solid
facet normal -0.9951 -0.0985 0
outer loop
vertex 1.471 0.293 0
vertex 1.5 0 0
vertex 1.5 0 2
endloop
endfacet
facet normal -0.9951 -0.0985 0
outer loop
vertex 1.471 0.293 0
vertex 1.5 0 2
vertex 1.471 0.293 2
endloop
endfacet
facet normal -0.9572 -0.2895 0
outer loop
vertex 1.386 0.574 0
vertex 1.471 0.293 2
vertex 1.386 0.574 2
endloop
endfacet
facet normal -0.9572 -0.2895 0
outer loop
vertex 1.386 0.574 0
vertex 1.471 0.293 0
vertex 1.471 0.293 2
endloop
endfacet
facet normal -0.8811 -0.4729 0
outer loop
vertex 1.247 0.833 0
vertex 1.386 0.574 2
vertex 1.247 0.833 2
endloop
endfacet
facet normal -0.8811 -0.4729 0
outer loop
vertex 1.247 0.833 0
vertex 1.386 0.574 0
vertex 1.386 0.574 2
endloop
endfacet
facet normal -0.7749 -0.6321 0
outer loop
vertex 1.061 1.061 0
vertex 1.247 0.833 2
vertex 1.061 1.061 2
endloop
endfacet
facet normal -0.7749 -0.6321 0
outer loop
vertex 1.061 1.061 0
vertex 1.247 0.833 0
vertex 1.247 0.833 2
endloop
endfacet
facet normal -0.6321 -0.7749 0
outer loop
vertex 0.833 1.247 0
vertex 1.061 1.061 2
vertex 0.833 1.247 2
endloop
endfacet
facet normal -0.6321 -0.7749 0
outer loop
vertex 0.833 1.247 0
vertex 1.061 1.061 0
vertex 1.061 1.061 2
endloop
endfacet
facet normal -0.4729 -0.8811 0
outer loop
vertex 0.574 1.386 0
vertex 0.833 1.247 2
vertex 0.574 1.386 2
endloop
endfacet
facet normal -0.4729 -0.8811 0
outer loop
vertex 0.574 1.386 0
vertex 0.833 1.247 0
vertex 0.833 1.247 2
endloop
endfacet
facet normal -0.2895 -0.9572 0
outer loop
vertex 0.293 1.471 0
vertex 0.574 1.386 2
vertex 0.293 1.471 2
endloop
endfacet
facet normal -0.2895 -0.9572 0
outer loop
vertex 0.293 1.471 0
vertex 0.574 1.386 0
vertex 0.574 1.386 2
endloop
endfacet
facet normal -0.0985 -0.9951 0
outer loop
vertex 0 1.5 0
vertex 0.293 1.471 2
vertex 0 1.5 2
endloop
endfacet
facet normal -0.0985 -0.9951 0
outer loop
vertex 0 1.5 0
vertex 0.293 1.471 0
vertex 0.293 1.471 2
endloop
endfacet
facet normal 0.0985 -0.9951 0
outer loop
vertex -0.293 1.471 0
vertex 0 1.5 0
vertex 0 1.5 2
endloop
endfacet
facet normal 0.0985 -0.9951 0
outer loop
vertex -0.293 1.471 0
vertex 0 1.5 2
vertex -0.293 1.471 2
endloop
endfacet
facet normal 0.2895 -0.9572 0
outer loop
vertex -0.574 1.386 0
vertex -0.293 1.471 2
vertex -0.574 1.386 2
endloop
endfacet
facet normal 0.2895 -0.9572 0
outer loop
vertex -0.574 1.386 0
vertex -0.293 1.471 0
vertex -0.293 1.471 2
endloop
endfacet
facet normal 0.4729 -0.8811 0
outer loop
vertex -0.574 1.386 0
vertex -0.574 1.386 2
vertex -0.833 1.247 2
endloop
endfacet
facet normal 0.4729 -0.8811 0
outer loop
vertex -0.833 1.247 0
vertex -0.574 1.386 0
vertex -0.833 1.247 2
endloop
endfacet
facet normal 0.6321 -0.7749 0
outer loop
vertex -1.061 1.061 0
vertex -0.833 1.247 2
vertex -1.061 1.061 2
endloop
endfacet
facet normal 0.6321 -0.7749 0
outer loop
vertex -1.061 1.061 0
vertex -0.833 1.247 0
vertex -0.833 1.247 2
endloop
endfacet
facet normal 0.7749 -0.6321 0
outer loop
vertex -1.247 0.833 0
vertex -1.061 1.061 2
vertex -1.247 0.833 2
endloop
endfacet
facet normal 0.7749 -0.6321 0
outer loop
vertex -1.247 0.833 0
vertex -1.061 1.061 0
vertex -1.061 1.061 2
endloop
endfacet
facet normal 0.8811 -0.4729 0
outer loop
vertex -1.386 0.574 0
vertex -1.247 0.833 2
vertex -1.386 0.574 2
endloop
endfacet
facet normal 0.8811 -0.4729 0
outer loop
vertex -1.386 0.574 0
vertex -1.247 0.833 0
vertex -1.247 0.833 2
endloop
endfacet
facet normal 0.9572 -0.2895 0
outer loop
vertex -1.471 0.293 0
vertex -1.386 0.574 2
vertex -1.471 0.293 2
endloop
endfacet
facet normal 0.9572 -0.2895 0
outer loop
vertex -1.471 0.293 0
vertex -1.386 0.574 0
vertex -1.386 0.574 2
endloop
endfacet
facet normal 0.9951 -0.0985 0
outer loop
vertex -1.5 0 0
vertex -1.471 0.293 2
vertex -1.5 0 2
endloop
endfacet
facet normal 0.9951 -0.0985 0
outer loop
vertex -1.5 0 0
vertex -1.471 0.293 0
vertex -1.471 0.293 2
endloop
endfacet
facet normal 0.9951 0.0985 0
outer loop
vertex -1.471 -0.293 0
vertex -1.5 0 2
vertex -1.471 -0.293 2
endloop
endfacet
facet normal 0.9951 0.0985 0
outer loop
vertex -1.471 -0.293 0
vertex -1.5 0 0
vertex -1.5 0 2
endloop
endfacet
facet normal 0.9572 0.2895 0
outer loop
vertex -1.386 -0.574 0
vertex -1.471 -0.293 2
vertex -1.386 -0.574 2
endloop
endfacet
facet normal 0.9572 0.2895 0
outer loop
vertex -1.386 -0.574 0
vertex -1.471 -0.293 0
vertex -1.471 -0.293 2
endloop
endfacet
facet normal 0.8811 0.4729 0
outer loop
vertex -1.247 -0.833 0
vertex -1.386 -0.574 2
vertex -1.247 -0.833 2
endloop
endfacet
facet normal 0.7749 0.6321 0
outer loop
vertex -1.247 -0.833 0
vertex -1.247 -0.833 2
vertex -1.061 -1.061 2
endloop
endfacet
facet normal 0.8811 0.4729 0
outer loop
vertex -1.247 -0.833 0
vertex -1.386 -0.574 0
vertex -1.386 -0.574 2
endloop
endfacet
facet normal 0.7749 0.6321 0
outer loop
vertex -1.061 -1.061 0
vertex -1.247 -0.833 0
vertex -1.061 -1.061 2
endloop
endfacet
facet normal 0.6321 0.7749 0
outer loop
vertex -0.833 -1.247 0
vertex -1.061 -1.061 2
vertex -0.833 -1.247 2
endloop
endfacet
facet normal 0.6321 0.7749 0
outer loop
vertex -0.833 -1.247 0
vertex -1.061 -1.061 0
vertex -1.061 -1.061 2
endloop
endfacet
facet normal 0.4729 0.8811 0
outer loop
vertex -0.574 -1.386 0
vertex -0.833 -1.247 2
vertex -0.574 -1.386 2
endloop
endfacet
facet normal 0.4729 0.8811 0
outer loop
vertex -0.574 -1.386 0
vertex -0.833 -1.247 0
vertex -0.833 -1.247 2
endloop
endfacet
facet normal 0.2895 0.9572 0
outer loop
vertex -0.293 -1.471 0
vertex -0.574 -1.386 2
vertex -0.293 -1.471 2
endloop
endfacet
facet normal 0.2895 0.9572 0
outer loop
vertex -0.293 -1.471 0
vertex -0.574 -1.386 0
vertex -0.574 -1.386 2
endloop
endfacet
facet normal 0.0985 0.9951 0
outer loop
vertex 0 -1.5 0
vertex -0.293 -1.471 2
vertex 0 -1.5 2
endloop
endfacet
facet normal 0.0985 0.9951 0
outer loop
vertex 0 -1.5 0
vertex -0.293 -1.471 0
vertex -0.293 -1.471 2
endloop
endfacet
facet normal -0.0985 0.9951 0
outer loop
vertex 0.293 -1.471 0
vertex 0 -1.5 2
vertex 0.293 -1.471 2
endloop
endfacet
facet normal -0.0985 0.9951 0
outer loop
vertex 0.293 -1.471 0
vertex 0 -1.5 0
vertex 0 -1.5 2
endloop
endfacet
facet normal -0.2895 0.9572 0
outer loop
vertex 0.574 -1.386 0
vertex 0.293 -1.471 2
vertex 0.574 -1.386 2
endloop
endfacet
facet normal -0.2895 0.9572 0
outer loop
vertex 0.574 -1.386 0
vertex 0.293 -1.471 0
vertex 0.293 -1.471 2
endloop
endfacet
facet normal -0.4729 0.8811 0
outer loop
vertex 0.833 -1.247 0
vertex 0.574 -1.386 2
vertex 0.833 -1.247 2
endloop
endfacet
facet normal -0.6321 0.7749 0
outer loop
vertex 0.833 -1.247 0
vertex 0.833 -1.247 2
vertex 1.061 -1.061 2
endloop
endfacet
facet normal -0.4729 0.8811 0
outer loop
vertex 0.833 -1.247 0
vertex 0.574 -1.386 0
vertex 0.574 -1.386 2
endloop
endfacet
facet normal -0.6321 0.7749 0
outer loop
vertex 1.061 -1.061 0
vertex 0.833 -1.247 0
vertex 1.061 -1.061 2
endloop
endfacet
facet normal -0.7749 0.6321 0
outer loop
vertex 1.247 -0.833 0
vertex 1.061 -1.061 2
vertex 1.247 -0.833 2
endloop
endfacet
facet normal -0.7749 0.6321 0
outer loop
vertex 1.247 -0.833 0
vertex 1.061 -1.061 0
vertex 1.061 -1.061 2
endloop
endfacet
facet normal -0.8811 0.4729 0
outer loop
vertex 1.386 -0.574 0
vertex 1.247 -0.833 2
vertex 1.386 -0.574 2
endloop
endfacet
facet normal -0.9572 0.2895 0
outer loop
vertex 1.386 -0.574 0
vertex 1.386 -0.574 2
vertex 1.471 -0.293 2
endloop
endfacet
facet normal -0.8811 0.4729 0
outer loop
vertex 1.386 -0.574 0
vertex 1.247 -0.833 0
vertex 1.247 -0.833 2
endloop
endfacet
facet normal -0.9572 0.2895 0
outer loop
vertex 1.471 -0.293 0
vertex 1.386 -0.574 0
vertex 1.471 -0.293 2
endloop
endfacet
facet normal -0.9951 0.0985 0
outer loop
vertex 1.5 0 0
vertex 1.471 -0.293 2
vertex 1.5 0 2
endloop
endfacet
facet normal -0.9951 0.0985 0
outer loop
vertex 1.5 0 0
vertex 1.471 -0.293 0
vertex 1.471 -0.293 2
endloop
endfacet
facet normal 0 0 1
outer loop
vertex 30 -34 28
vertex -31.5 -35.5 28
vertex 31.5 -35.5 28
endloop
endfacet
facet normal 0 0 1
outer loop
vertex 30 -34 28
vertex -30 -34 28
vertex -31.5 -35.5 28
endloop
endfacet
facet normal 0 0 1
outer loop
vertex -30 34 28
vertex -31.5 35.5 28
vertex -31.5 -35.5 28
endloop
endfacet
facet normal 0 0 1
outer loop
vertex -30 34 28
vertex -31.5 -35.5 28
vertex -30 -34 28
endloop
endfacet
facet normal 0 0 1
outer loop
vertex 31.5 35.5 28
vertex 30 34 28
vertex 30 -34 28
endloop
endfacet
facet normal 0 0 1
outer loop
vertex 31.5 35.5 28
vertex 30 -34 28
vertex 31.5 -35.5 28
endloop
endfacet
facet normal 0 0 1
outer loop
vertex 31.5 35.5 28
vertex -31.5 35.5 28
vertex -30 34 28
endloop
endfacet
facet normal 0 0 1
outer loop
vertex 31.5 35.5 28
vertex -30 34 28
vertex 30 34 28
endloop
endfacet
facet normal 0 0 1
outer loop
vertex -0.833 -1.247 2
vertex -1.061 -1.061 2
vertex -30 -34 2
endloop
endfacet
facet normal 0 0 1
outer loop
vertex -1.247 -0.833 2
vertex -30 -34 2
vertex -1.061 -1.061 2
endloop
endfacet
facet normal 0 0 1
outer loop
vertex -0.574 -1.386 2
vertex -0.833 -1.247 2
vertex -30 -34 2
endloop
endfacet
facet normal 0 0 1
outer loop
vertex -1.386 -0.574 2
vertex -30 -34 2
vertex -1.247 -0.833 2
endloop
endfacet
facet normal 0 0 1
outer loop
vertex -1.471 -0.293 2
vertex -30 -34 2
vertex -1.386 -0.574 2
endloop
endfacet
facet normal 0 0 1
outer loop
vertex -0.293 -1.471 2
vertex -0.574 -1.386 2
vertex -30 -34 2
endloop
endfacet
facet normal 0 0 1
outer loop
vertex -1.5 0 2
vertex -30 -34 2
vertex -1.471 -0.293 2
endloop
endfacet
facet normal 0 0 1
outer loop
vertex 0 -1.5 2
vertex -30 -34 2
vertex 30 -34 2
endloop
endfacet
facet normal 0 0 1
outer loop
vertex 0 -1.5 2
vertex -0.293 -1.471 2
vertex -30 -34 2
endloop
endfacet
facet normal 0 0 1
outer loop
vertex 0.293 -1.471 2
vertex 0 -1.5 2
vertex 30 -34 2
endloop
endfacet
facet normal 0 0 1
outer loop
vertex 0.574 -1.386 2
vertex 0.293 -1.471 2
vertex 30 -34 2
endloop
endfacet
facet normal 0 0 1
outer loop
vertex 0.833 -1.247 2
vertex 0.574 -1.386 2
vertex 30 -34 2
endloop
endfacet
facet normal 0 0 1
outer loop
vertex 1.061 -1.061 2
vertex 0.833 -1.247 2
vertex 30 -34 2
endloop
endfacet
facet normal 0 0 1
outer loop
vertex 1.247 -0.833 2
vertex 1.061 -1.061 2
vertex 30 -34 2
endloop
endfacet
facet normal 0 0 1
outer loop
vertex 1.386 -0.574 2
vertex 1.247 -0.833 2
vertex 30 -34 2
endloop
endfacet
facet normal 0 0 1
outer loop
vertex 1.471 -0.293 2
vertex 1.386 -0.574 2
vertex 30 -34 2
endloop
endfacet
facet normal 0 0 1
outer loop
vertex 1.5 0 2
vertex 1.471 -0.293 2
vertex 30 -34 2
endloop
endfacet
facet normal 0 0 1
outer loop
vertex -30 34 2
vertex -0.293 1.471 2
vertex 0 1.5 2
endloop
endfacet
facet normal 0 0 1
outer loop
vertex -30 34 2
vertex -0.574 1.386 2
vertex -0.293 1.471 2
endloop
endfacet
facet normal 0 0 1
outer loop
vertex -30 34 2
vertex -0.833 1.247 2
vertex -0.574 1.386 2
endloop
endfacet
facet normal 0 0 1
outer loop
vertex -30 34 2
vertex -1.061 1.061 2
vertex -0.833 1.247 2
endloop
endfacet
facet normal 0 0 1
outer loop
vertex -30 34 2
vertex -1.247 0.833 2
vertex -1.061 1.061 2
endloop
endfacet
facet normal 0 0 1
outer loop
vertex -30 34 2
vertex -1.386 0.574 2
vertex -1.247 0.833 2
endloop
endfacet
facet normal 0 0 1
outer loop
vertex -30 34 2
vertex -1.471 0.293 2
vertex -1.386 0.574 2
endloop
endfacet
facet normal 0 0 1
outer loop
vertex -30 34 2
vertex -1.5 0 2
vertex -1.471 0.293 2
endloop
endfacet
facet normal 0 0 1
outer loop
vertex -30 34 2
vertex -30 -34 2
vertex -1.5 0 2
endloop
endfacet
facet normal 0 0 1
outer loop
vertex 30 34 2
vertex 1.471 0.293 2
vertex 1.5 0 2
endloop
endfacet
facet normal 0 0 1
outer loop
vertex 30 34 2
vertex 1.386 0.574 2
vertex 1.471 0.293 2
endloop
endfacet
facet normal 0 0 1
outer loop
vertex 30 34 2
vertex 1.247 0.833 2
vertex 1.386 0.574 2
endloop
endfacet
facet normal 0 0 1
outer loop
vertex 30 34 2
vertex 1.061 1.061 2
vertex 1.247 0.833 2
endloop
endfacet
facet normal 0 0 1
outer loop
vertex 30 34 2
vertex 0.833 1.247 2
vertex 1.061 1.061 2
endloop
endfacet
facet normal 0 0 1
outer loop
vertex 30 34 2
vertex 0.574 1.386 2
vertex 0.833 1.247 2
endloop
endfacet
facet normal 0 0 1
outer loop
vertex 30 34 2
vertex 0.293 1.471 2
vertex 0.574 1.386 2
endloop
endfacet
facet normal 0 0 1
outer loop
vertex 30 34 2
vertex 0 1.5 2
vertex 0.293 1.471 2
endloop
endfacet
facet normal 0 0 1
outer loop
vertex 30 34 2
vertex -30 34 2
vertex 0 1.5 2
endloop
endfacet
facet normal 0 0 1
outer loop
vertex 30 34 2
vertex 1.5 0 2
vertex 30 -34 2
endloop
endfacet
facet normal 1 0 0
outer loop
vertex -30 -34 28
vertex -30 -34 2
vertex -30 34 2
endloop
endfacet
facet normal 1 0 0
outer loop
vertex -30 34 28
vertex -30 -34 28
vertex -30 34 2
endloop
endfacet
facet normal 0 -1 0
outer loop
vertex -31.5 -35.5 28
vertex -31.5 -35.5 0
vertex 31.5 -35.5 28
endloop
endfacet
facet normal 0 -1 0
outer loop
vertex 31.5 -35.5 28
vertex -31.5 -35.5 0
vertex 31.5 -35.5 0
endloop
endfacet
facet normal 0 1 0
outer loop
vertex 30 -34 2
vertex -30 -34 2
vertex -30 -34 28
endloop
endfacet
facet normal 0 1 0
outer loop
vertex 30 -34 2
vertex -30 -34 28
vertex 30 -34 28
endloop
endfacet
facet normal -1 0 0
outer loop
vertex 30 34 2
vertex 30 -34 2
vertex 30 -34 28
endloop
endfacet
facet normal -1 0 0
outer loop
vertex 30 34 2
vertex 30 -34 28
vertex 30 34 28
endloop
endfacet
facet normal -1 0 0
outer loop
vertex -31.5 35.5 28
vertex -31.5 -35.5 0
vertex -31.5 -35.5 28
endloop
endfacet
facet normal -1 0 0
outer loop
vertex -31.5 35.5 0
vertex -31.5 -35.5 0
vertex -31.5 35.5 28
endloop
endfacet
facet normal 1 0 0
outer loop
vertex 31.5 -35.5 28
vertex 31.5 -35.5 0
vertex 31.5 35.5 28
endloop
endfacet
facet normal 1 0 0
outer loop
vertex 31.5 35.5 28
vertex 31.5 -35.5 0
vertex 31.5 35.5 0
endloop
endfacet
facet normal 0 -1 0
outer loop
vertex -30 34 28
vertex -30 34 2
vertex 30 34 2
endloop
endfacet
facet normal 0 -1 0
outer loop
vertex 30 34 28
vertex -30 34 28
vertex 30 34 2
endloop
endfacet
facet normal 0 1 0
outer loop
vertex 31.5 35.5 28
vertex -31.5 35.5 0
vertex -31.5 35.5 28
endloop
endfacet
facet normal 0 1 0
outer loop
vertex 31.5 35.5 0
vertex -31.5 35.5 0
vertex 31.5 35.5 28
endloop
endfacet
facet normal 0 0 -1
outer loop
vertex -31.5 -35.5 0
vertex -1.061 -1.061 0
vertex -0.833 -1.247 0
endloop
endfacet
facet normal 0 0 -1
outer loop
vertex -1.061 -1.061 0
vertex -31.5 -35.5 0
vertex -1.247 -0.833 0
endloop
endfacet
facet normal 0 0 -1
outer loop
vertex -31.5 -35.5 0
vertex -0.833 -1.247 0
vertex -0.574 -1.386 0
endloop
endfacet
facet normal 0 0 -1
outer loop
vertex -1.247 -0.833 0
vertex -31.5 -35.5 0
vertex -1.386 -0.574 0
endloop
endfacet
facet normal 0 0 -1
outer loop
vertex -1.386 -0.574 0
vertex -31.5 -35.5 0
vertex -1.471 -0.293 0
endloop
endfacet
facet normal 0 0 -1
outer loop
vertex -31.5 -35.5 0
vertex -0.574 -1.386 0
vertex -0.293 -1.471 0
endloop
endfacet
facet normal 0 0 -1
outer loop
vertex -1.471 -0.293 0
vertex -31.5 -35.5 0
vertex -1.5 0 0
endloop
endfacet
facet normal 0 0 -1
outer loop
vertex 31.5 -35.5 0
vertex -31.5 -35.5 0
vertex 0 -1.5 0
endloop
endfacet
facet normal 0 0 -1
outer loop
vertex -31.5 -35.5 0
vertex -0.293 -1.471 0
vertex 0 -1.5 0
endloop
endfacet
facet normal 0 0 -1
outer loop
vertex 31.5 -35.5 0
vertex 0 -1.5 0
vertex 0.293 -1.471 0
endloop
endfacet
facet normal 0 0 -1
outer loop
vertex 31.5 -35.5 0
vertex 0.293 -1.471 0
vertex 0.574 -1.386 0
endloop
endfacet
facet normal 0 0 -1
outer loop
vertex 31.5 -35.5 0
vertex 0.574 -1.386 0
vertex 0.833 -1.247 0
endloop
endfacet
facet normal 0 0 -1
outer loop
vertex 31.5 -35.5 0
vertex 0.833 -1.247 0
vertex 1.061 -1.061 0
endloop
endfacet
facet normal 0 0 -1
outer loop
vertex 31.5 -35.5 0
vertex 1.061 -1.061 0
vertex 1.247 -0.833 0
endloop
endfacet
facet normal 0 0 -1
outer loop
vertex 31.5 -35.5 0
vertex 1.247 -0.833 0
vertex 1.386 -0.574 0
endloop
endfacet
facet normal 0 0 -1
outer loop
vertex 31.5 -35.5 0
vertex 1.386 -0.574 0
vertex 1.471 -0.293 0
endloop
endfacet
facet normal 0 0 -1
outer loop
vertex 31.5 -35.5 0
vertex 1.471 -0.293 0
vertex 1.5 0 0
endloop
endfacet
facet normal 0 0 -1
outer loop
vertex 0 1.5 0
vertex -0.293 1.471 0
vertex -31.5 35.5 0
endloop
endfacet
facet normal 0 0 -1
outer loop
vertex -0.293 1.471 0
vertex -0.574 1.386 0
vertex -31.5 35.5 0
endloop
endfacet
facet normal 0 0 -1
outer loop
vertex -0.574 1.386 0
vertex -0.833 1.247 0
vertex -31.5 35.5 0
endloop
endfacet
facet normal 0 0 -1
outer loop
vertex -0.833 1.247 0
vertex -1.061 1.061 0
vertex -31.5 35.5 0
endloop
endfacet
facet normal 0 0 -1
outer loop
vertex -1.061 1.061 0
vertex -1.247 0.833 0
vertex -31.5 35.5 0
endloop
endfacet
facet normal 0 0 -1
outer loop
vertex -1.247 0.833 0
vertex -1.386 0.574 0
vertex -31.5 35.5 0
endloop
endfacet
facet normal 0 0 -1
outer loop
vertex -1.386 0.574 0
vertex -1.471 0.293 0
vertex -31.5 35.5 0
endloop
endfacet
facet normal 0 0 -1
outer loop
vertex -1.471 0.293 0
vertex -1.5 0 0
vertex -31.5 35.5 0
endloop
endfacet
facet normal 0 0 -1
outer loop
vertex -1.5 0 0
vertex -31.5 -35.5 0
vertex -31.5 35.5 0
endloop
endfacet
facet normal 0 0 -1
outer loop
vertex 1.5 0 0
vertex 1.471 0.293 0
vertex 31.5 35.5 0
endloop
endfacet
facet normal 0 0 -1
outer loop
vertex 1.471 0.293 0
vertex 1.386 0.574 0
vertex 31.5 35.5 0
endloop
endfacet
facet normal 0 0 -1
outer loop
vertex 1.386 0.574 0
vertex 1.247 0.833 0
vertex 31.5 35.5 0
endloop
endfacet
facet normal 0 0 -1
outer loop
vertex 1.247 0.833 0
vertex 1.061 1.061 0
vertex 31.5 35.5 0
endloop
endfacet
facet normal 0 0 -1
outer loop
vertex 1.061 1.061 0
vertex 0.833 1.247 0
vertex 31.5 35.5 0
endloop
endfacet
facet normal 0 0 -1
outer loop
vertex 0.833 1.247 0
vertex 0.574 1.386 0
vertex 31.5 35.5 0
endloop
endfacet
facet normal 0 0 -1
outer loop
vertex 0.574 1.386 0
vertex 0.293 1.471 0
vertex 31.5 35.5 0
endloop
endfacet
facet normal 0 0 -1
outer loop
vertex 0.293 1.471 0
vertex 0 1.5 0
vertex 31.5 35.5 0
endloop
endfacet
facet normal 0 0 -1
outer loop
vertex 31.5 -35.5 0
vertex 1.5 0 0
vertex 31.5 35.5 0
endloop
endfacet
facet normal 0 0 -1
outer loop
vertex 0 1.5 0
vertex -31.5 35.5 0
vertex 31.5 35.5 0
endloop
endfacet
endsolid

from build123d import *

# Parameters (mm, degrees)
F0_W     = 63
F0_H     = 71
F0_W_2   = 60
F0_H_2   = 68
F0_R     = 1.5
F1_DEPTH = 2
F2_DEPTH = 28


with BuildPart() as f1:
    # F0 (on Top) → F1 (new body)
    with BuildSketch(Plane.XY):
        Rectangle(F0_W, F0_H)
        Rectangle(F0_W_2, F0_H_2, mode=Mode.SUBTRACT)
        Rectangle(F0_W_2, F0_H_2)
        Circle(F0_R, mode=Mode.SUBTRACT)
    extrude(amount=F1_DEPTH)

    # F0 (on Top) → F2 (join)
    with BuildSketch(Plane.XY):
        Rectangle(F0_W, F0_H)
        Rectangle(F0_W_2, F0_H_2, mode=Mode.SUBTRACT)
    extrude(amount=F2_DEPTH)


solid = f1.part
